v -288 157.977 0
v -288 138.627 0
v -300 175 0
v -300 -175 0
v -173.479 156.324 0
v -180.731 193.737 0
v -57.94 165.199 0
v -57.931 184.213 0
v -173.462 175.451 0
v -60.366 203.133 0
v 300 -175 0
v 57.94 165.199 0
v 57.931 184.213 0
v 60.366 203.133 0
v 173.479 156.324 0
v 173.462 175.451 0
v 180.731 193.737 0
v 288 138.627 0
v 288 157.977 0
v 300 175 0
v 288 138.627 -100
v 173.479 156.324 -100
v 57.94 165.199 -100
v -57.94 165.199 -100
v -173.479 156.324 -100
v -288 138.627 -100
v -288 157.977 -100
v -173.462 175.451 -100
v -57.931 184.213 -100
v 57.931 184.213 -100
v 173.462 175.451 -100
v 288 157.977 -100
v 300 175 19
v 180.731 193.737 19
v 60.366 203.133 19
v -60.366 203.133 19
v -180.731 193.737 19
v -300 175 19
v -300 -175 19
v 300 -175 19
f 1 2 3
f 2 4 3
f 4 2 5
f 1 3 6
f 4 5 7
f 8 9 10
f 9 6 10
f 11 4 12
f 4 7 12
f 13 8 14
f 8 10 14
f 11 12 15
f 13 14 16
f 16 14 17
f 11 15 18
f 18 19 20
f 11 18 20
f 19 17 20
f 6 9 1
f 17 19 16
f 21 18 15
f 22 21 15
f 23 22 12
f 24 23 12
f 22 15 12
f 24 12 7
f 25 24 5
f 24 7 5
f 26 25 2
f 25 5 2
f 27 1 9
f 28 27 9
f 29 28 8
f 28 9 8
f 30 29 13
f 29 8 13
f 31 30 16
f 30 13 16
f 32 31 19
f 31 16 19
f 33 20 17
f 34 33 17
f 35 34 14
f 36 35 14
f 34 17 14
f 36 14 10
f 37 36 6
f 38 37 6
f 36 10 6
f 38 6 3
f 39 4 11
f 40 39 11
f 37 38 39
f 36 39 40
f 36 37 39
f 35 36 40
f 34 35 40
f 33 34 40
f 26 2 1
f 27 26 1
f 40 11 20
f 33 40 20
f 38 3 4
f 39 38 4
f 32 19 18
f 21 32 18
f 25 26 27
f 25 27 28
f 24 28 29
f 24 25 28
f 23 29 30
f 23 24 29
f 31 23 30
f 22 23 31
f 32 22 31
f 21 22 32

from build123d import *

# Parameters (mm, degrees)
F1_DEPTH = 19
F3_DEPTH = 100


# Not quite as in the source:
# - a feature of the source that left no trace in its solid (it failed there, or was rolled back) is left out


with BuildPart() as f1:
    # F0 (on Top) → F1 (new body)
    with BuildSketch(Plane.XY):
        with BuildLine():
            Line((-300, -175), (300, -175))
            Line((300, -175), (300, 175))
            ThreePointArc((300, 175), (0, 204.3093674254), (-300, 175))
            Line((-300, 175), (-300, -175))
        make_face()
    extrude(amount=F1_DEPTH)

    # F2 (on face) → F3 (join)
    with BuildSketch(Plane(origin=(0, 0, 0), x_dir=(1, 0, 0), z_dir=(0, 0, -1))):
        with BuildLine():
            Line((-288, -138.6273926478), (-288, -157.9772163868))
            ThreePointArc((-288, -157.9772163868), (0, -185.3093674254), (288, -157.9772163868))
            Line((288, -157.9772163868), (288, -138.6273926478))
            ThreePointArc((288, -138.6273926478), (0, -166.3093674254), (-288, -138.6273926478))
        make_face()
    extrude(amount=F3_DEPTH)


solid = f1.part
